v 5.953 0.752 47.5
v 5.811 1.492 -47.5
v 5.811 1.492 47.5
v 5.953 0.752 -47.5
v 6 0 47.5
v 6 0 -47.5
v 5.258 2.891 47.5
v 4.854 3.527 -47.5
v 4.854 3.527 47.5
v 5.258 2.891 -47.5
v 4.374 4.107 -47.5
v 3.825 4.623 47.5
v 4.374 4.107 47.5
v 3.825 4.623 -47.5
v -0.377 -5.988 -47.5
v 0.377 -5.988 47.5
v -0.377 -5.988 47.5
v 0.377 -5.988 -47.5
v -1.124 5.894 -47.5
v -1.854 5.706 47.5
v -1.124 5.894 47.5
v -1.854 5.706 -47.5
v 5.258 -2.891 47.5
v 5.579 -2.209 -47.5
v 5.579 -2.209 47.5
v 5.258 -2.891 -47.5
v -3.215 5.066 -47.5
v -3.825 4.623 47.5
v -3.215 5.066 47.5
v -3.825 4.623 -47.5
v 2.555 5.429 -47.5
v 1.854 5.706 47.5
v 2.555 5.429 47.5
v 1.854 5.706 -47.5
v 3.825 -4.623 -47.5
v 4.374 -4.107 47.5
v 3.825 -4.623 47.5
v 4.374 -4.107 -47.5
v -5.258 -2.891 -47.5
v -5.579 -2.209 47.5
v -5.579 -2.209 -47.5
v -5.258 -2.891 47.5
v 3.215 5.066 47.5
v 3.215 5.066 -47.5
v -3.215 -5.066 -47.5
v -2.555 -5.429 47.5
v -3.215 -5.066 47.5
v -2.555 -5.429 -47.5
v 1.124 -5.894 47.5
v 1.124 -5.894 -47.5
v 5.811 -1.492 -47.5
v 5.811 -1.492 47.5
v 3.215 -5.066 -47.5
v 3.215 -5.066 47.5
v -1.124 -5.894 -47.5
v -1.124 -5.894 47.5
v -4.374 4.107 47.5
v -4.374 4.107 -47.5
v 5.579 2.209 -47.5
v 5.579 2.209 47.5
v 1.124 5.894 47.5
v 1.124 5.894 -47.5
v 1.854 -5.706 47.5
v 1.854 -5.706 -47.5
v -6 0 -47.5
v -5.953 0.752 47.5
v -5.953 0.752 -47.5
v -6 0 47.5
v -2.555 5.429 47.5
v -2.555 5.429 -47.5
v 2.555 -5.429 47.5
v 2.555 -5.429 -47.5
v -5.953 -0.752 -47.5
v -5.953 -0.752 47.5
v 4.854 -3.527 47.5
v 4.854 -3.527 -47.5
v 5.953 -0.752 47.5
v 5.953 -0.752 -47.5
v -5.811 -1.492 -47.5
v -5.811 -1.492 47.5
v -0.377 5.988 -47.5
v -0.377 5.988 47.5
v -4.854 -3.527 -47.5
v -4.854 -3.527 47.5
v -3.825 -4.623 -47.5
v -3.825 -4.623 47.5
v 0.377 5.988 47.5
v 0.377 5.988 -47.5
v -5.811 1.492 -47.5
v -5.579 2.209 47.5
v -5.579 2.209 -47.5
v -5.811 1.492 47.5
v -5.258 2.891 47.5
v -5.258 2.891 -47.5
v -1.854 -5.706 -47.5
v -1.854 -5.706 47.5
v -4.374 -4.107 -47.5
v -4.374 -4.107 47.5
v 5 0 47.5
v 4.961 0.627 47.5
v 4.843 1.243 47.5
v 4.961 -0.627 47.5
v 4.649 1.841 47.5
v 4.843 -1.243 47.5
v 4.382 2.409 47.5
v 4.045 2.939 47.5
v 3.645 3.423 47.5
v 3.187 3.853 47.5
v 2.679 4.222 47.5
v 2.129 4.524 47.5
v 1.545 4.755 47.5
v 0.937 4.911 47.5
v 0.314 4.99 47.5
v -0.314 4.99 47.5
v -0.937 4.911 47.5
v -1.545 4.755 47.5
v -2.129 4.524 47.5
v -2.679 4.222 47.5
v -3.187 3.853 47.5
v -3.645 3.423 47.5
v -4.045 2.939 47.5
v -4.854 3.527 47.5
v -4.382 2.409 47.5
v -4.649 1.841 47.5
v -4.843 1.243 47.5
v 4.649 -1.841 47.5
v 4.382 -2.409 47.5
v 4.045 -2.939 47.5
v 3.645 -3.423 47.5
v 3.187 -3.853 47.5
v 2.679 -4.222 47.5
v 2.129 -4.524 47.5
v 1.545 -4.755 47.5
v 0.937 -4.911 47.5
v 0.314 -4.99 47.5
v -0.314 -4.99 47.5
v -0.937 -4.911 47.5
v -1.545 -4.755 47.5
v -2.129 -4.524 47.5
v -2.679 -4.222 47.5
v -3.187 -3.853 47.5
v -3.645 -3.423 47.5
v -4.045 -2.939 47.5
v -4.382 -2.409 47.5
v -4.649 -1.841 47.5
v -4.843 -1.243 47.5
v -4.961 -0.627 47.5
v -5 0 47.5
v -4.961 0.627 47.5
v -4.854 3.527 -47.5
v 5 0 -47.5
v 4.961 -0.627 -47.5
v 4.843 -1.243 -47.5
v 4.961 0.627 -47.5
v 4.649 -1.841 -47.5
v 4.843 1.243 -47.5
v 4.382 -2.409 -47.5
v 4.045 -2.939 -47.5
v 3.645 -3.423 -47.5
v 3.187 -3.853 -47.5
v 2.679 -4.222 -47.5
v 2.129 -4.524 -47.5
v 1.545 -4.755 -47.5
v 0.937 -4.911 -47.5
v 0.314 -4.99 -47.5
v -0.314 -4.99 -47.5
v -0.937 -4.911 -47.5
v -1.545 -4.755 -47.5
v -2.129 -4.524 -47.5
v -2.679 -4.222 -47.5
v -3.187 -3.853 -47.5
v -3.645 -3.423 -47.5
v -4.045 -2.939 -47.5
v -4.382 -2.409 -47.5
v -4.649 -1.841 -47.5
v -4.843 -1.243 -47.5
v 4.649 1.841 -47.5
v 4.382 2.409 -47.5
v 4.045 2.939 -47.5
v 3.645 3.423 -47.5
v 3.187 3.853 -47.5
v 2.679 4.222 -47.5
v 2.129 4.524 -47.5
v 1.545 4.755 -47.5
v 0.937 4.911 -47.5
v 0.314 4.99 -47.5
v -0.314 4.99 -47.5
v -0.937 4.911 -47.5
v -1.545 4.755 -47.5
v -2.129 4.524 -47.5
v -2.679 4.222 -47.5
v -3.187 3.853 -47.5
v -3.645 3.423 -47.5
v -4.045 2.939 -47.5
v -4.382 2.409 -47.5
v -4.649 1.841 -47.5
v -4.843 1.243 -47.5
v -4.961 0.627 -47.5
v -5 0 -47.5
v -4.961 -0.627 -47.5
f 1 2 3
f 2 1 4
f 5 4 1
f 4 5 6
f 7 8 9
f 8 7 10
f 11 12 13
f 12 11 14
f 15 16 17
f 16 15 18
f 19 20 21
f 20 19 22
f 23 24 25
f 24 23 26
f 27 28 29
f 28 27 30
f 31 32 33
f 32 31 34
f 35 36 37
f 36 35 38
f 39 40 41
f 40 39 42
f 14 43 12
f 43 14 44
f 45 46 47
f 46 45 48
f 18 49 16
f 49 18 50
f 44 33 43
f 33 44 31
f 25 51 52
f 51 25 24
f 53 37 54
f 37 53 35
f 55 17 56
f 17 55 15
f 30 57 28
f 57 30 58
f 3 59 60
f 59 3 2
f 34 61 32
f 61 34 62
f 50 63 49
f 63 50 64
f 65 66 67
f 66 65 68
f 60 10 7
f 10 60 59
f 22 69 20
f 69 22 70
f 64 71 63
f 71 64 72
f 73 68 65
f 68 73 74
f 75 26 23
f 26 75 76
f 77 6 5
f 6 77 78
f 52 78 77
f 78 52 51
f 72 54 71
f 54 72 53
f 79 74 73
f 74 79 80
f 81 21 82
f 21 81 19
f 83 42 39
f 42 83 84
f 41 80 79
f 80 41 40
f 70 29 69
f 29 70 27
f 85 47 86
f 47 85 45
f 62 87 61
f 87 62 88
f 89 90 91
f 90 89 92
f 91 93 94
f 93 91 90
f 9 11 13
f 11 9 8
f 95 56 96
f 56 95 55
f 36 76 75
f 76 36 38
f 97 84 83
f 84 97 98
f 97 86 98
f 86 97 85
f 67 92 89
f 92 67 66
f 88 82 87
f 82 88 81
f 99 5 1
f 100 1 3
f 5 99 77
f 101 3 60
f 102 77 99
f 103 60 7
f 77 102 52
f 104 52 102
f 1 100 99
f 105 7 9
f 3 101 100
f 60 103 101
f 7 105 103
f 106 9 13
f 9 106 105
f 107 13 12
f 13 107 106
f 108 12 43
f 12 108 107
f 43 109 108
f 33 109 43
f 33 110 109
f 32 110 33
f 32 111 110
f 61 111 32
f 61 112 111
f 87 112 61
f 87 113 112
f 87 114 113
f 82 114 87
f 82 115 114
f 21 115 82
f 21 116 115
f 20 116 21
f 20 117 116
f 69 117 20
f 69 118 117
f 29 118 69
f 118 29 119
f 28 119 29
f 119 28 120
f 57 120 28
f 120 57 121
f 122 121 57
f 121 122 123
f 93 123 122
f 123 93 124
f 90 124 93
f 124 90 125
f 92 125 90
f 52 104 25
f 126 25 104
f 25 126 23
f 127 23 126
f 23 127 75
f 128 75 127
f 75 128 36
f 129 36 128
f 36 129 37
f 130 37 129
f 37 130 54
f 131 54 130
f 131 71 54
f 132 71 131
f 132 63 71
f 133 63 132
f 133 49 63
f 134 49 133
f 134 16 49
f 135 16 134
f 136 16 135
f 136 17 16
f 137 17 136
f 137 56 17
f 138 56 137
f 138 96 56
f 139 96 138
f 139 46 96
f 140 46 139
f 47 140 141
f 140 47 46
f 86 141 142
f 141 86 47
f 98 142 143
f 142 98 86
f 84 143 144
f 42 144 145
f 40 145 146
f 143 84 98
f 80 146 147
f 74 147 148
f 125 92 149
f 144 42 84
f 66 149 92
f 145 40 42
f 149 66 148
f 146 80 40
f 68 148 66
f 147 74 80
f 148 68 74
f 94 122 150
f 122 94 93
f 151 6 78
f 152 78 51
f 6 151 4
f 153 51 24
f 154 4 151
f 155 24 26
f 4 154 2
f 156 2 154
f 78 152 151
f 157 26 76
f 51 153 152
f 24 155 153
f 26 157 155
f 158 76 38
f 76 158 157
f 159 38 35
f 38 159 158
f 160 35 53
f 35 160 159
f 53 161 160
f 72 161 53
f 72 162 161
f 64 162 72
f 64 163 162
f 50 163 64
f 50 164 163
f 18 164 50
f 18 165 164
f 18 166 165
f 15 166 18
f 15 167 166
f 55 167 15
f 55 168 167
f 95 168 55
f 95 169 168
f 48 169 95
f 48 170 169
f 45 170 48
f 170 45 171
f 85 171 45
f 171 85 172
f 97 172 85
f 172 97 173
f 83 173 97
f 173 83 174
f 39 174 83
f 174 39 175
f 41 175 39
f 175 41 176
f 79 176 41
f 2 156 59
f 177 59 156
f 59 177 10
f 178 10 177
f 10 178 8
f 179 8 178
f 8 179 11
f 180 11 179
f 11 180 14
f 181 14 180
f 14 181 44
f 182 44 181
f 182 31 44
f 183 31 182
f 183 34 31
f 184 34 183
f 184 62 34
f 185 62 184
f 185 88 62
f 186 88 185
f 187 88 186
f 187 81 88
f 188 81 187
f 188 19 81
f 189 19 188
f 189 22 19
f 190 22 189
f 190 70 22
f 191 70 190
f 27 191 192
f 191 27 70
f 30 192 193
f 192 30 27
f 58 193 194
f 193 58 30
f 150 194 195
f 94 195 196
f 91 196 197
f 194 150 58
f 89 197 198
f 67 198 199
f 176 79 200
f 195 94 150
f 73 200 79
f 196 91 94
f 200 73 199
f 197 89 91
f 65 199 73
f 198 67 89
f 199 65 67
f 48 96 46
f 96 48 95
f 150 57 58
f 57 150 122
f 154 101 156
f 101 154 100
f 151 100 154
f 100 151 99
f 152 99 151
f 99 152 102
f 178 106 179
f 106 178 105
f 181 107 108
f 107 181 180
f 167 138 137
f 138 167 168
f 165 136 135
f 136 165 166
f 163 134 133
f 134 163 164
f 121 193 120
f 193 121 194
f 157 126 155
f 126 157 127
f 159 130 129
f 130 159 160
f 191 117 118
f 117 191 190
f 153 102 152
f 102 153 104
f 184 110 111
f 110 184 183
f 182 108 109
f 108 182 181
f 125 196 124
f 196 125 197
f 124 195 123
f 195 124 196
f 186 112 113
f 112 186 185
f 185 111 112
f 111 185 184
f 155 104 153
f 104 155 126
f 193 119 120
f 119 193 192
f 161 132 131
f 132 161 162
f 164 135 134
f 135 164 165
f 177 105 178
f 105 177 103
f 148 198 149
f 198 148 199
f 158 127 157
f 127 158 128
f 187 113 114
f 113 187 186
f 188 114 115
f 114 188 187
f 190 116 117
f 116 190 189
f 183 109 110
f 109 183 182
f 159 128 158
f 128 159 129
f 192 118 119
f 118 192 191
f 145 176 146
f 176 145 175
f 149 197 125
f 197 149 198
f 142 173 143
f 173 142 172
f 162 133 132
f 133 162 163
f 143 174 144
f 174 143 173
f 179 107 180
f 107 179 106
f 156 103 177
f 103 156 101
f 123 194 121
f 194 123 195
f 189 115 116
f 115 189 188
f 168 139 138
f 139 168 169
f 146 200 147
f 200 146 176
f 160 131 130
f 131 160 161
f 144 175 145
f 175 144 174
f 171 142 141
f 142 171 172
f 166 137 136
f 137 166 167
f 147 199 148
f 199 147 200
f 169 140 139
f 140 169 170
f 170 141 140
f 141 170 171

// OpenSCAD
$fn = 50;


difference() {
	union() {
		translate(v = [0, 0, -47.5000000000]) {
			cylinder(h = 95, r = 6.0000000000);
		}
	}
	union() {
		translate(v = [0, 0, -100.0000000000]) {
			cylinder(h = 200, r = 5.0000000000);
		}
	}
}
